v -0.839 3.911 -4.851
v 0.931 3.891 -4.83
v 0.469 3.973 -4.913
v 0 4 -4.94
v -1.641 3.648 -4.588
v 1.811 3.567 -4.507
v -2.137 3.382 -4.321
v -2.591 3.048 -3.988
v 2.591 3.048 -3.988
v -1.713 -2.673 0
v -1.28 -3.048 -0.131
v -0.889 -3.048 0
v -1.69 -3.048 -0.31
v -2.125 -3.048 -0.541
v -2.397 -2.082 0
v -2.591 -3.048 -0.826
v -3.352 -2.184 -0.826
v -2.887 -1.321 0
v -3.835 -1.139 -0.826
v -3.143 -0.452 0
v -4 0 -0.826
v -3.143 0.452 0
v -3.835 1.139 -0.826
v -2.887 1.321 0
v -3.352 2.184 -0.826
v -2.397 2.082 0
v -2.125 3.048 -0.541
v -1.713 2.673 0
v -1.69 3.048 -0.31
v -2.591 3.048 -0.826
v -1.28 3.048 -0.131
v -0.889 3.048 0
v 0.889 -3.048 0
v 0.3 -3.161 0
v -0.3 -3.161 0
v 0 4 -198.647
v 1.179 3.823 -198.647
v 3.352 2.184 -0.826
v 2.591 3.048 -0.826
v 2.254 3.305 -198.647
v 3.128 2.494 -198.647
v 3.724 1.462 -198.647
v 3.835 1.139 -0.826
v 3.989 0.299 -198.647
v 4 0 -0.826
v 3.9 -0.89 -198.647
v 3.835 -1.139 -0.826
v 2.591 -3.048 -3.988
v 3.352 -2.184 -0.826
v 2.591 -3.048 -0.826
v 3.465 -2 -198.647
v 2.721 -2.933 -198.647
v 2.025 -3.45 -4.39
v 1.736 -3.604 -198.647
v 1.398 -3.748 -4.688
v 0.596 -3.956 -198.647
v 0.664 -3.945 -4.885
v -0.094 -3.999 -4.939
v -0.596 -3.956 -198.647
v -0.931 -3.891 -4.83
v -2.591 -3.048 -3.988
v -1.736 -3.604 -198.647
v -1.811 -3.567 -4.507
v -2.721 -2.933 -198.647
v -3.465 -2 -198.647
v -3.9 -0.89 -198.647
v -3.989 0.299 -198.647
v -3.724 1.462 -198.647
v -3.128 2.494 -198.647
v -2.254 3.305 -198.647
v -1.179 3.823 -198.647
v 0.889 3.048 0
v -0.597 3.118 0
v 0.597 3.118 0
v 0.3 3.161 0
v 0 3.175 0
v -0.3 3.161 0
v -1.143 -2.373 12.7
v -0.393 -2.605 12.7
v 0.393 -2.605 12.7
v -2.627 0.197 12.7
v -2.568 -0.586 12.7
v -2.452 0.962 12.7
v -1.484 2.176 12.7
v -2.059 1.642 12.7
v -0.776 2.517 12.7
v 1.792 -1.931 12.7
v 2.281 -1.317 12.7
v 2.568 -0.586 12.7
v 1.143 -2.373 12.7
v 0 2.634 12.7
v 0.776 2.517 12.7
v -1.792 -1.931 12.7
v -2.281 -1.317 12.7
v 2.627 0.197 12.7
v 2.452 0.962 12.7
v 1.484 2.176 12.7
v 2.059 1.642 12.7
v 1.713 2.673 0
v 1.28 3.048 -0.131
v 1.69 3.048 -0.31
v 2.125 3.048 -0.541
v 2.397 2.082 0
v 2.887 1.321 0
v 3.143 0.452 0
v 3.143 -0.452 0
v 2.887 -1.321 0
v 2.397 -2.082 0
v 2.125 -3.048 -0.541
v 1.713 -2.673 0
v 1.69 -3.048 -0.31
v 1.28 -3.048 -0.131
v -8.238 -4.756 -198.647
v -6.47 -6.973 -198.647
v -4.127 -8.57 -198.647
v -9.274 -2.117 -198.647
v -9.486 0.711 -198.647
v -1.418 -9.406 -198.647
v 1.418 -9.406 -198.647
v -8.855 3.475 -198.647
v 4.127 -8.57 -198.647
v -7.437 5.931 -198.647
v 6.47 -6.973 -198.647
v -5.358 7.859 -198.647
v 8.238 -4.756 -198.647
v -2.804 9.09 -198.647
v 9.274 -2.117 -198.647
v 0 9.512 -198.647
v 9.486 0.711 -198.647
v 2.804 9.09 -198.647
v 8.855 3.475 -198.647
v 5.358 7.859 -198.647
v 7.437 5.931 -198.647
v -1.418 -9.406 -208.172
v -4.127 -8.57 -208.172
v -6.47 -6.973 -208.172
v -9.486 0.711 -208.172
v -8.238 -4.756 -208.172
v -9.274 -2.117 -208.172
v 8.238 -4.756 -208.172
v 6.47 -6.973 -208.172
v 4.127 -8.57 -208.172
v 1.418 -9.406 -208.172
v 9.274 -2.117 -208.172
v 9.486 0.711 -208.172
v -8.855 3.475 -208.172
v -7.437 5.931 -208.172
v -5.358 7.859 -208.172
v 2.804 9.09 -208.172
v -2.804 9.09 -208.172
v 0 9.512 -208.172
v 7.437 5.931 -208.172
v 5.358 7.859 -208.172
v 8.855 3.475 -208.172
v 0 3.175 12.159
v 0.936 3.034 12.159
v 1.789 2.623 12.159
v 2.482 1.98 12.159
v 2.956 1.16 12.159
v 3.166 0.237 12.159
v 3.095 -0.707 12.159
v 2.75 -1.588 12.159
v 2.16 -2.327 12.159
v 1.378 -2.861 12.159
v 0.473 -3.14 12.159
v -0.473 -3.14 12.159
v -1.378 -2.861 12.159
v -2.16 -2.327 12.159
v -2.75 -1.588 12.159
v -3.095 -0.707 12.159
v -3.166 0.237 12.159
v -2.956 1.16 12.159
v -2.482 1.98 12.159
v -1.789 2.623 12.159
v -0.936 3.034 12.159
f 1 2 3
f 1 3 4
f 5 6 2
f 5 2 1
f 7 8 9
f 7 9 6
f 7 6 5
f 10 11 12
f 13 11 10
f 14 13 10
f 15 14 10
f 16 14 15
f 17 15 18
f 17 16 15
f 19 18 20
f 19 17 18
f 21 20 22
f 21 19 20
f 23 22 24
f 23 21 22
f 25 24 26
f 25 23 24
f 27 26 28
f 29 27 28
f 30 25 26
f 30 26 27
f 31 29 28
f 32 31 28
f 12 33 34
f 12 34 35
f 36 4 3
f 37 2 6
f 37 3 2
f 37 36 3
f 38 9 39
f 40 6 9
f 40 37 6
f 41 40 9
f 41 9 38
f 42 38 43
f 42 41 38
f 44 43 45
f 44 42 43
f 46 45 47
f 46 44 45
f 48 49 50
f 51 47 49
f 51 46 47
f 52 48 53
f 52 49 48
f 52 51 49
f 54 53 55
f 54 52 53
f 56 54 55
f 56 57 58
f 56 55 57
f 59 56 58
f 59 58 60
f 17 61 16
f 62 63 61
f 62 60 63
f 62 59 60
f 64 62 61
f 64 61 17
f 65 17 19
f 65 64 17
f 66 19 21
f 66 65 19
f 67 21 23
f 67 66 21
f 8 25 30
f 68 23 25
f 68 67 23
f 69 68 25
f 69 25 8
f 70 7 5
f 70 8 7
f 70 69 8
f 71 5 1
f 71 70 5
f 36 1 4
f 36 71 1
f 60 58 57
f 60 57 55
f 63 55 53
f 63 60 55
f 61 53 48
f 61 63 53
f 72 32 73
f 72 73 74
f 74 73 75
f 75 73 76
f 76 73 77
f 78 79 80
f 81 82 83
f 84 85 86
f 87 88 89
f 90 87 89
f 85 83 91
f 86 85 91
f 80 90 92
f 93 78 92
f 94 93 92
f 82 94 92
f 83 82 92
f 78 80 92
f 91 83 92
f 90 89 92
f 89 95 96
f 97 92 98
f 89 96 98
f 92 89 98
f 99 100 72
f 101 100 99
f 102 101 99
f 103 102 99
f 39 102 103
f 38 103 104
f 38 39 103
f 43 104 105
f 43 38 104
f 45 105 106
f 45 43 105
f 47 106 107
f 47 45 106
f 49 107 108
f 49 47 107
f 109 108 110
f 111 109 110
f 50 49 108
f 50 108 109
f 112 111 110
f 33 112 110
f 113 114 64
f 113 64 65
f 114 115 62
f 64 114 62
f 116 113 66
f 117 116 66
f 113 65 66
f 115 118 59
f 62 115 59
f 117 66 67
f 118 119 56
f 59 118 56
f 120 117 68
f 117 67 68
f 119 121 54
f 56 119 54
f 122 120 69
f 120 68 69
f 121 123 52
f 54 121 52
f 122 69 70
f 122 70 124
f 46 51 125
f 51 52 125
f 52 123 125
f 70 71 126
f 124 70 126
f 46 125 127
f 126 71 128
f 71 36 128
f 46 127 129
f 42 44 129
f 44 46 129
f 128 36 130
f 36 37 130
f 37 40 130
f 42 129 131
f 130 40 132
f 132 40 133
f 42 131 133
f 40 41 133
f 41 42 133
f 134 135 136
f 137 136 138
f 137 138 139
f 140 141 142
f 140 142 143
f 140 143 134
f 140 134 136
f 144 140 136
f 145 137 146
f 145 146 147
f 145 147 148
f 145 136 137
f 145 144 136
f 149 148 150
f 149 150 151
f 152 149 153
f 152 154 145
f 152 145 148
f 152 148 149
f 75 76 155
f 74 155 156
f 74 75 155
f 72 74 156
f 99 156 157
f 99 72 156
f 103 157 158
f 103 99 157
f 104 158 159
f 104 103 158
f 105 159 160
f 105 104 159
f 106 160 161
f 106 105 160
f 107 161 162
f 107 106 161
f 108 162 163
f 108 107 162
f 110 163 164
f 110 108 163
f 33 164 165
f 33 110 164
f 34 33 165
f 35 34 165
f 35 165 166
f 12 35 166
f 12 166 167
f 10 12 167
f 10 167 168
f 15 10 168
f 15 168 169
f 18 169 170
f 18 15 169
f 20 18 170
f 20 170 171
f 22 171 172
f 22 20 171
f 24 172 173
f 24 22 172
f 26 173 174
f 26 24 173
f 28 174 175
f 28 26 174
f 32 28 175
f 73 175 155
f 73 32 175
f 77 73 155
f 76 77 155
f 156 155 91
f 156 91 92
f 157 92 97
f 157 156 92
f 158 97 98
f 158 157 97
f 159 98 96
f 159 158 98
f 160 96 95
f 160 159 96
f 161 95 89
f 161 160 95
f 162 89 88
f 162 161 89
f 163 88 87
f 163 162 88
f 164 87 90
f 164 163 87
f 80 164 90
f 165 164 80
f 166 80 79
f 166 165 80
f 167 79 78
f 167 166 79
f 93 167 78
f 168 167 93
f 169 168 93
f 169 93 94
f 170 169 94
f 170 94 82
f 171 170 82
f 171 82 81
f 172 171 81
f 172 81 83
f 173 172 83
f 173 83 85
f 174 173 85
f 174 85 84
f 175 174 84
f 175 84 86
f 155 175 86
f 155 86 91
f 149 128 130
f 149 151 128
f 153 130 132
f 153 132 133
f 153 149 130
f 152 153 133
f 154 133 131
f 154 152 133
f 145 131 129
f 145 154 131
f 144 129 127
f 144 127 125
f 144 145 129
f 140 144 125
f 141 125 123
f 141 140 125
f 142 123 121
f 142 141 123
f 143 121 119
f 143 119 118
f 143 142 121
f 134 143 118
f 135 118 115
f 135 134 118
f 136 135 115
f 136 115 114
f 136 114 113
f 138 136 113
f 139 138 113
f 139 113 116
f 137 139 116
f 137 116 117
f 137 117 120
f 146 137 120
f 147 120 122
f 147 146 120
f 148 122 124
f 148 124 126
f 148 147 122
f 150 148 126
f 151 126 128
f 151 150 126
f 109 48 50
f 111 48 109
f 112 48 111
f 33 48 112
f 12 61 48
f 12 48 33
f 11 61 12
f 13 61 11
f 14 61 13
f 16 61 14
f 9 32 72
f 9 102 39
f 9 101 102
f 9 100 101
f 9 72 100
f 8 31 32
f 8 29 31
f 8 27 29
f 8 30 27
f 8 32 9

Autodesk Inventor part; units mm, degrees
sketch "Sketch_1" plane through (0, 0, 0) normal (1, 0, 0) x (0, 1, 0)
  line L0 (0, -208.1721) -> (0, 12.7)
  line L1 (0, 12.7) -> (2.634, 12.7)
  line L2 (2.634, 12.7) -> (3.175, 12.159)
  line L3 (3.175, 12.159) -> (3.175, 0)
  line L4 (3.175, 0) -> (4.0005, -0.8255)
  line L5 (4.0005, -0.8255) -> (4.0005, -198.6471)
  line L6 (4.0005, -198.6471) -> (9.5123, -198.6471)
  line L7 (9.5123, -198.6471) -> (9.5123, -208.1721)
  line L8 (9.5123, -208.1721) -> (0, -208.1721)
  line L9 (0, -208.1721) -> (0, 12.7)
revolve "Revolution1" add sketch "Sketch_1" angle 360 about axis through (0, 0, -208.1721) along (0, 0, -1)
thread "Thread1" size "1/4-28 UNF" class "2A" standard "ANSI Unified Screw Threads" full length
sketch "Sketch_2" plane through (0, 0, 0) normal (1, 0, 0) x (0, 1, 0)
  line L0 (6.096, 0) -> (3.048, 0)
  line L1 (3.048, 0) -> (3.048, -3.9878)
  line L2 (3.048, -3.9878) -> (6.096, -7.0358)
  line L3 (6.096, -7.0358) -> (6.096, 0)
extrude "Extrusion1" cut sketch "Sketch_2" along normal mid plane 16.002
sketch "Sketch_3" plane through (0, 0, 0) normal (1, 0, 0) x (0, 1, 0)
  line L0 (-6.096, 0) -> (-6.096, -7.0358)
  line L1 (-6.096, -7.0358) -> (-3.048, -3.9878)
  line L2 (-3.048, -3.9878) -> (-3.048, 0)
  line L3 (-3.048, 0) -> (-6.096, 0)
extrude "Extrusion2" cut sketch "Sketch_3" along normal mid plane 16.002
ref_plane "conn_XY" through (0, 0, 0) normal (0, 0, -1) x (1, 0, 0)
ref_plane "conn_YZ" through (0, 0, 0) normal (1, 0, 0) x (0, -1, 0)
ref_plane "conn_ZX" through (0, 0, 0) normal (0, -1, 0) x (0, 0, -1)
properties part number "PR_OCG1-3/4x6" material "Stainless Steel"
